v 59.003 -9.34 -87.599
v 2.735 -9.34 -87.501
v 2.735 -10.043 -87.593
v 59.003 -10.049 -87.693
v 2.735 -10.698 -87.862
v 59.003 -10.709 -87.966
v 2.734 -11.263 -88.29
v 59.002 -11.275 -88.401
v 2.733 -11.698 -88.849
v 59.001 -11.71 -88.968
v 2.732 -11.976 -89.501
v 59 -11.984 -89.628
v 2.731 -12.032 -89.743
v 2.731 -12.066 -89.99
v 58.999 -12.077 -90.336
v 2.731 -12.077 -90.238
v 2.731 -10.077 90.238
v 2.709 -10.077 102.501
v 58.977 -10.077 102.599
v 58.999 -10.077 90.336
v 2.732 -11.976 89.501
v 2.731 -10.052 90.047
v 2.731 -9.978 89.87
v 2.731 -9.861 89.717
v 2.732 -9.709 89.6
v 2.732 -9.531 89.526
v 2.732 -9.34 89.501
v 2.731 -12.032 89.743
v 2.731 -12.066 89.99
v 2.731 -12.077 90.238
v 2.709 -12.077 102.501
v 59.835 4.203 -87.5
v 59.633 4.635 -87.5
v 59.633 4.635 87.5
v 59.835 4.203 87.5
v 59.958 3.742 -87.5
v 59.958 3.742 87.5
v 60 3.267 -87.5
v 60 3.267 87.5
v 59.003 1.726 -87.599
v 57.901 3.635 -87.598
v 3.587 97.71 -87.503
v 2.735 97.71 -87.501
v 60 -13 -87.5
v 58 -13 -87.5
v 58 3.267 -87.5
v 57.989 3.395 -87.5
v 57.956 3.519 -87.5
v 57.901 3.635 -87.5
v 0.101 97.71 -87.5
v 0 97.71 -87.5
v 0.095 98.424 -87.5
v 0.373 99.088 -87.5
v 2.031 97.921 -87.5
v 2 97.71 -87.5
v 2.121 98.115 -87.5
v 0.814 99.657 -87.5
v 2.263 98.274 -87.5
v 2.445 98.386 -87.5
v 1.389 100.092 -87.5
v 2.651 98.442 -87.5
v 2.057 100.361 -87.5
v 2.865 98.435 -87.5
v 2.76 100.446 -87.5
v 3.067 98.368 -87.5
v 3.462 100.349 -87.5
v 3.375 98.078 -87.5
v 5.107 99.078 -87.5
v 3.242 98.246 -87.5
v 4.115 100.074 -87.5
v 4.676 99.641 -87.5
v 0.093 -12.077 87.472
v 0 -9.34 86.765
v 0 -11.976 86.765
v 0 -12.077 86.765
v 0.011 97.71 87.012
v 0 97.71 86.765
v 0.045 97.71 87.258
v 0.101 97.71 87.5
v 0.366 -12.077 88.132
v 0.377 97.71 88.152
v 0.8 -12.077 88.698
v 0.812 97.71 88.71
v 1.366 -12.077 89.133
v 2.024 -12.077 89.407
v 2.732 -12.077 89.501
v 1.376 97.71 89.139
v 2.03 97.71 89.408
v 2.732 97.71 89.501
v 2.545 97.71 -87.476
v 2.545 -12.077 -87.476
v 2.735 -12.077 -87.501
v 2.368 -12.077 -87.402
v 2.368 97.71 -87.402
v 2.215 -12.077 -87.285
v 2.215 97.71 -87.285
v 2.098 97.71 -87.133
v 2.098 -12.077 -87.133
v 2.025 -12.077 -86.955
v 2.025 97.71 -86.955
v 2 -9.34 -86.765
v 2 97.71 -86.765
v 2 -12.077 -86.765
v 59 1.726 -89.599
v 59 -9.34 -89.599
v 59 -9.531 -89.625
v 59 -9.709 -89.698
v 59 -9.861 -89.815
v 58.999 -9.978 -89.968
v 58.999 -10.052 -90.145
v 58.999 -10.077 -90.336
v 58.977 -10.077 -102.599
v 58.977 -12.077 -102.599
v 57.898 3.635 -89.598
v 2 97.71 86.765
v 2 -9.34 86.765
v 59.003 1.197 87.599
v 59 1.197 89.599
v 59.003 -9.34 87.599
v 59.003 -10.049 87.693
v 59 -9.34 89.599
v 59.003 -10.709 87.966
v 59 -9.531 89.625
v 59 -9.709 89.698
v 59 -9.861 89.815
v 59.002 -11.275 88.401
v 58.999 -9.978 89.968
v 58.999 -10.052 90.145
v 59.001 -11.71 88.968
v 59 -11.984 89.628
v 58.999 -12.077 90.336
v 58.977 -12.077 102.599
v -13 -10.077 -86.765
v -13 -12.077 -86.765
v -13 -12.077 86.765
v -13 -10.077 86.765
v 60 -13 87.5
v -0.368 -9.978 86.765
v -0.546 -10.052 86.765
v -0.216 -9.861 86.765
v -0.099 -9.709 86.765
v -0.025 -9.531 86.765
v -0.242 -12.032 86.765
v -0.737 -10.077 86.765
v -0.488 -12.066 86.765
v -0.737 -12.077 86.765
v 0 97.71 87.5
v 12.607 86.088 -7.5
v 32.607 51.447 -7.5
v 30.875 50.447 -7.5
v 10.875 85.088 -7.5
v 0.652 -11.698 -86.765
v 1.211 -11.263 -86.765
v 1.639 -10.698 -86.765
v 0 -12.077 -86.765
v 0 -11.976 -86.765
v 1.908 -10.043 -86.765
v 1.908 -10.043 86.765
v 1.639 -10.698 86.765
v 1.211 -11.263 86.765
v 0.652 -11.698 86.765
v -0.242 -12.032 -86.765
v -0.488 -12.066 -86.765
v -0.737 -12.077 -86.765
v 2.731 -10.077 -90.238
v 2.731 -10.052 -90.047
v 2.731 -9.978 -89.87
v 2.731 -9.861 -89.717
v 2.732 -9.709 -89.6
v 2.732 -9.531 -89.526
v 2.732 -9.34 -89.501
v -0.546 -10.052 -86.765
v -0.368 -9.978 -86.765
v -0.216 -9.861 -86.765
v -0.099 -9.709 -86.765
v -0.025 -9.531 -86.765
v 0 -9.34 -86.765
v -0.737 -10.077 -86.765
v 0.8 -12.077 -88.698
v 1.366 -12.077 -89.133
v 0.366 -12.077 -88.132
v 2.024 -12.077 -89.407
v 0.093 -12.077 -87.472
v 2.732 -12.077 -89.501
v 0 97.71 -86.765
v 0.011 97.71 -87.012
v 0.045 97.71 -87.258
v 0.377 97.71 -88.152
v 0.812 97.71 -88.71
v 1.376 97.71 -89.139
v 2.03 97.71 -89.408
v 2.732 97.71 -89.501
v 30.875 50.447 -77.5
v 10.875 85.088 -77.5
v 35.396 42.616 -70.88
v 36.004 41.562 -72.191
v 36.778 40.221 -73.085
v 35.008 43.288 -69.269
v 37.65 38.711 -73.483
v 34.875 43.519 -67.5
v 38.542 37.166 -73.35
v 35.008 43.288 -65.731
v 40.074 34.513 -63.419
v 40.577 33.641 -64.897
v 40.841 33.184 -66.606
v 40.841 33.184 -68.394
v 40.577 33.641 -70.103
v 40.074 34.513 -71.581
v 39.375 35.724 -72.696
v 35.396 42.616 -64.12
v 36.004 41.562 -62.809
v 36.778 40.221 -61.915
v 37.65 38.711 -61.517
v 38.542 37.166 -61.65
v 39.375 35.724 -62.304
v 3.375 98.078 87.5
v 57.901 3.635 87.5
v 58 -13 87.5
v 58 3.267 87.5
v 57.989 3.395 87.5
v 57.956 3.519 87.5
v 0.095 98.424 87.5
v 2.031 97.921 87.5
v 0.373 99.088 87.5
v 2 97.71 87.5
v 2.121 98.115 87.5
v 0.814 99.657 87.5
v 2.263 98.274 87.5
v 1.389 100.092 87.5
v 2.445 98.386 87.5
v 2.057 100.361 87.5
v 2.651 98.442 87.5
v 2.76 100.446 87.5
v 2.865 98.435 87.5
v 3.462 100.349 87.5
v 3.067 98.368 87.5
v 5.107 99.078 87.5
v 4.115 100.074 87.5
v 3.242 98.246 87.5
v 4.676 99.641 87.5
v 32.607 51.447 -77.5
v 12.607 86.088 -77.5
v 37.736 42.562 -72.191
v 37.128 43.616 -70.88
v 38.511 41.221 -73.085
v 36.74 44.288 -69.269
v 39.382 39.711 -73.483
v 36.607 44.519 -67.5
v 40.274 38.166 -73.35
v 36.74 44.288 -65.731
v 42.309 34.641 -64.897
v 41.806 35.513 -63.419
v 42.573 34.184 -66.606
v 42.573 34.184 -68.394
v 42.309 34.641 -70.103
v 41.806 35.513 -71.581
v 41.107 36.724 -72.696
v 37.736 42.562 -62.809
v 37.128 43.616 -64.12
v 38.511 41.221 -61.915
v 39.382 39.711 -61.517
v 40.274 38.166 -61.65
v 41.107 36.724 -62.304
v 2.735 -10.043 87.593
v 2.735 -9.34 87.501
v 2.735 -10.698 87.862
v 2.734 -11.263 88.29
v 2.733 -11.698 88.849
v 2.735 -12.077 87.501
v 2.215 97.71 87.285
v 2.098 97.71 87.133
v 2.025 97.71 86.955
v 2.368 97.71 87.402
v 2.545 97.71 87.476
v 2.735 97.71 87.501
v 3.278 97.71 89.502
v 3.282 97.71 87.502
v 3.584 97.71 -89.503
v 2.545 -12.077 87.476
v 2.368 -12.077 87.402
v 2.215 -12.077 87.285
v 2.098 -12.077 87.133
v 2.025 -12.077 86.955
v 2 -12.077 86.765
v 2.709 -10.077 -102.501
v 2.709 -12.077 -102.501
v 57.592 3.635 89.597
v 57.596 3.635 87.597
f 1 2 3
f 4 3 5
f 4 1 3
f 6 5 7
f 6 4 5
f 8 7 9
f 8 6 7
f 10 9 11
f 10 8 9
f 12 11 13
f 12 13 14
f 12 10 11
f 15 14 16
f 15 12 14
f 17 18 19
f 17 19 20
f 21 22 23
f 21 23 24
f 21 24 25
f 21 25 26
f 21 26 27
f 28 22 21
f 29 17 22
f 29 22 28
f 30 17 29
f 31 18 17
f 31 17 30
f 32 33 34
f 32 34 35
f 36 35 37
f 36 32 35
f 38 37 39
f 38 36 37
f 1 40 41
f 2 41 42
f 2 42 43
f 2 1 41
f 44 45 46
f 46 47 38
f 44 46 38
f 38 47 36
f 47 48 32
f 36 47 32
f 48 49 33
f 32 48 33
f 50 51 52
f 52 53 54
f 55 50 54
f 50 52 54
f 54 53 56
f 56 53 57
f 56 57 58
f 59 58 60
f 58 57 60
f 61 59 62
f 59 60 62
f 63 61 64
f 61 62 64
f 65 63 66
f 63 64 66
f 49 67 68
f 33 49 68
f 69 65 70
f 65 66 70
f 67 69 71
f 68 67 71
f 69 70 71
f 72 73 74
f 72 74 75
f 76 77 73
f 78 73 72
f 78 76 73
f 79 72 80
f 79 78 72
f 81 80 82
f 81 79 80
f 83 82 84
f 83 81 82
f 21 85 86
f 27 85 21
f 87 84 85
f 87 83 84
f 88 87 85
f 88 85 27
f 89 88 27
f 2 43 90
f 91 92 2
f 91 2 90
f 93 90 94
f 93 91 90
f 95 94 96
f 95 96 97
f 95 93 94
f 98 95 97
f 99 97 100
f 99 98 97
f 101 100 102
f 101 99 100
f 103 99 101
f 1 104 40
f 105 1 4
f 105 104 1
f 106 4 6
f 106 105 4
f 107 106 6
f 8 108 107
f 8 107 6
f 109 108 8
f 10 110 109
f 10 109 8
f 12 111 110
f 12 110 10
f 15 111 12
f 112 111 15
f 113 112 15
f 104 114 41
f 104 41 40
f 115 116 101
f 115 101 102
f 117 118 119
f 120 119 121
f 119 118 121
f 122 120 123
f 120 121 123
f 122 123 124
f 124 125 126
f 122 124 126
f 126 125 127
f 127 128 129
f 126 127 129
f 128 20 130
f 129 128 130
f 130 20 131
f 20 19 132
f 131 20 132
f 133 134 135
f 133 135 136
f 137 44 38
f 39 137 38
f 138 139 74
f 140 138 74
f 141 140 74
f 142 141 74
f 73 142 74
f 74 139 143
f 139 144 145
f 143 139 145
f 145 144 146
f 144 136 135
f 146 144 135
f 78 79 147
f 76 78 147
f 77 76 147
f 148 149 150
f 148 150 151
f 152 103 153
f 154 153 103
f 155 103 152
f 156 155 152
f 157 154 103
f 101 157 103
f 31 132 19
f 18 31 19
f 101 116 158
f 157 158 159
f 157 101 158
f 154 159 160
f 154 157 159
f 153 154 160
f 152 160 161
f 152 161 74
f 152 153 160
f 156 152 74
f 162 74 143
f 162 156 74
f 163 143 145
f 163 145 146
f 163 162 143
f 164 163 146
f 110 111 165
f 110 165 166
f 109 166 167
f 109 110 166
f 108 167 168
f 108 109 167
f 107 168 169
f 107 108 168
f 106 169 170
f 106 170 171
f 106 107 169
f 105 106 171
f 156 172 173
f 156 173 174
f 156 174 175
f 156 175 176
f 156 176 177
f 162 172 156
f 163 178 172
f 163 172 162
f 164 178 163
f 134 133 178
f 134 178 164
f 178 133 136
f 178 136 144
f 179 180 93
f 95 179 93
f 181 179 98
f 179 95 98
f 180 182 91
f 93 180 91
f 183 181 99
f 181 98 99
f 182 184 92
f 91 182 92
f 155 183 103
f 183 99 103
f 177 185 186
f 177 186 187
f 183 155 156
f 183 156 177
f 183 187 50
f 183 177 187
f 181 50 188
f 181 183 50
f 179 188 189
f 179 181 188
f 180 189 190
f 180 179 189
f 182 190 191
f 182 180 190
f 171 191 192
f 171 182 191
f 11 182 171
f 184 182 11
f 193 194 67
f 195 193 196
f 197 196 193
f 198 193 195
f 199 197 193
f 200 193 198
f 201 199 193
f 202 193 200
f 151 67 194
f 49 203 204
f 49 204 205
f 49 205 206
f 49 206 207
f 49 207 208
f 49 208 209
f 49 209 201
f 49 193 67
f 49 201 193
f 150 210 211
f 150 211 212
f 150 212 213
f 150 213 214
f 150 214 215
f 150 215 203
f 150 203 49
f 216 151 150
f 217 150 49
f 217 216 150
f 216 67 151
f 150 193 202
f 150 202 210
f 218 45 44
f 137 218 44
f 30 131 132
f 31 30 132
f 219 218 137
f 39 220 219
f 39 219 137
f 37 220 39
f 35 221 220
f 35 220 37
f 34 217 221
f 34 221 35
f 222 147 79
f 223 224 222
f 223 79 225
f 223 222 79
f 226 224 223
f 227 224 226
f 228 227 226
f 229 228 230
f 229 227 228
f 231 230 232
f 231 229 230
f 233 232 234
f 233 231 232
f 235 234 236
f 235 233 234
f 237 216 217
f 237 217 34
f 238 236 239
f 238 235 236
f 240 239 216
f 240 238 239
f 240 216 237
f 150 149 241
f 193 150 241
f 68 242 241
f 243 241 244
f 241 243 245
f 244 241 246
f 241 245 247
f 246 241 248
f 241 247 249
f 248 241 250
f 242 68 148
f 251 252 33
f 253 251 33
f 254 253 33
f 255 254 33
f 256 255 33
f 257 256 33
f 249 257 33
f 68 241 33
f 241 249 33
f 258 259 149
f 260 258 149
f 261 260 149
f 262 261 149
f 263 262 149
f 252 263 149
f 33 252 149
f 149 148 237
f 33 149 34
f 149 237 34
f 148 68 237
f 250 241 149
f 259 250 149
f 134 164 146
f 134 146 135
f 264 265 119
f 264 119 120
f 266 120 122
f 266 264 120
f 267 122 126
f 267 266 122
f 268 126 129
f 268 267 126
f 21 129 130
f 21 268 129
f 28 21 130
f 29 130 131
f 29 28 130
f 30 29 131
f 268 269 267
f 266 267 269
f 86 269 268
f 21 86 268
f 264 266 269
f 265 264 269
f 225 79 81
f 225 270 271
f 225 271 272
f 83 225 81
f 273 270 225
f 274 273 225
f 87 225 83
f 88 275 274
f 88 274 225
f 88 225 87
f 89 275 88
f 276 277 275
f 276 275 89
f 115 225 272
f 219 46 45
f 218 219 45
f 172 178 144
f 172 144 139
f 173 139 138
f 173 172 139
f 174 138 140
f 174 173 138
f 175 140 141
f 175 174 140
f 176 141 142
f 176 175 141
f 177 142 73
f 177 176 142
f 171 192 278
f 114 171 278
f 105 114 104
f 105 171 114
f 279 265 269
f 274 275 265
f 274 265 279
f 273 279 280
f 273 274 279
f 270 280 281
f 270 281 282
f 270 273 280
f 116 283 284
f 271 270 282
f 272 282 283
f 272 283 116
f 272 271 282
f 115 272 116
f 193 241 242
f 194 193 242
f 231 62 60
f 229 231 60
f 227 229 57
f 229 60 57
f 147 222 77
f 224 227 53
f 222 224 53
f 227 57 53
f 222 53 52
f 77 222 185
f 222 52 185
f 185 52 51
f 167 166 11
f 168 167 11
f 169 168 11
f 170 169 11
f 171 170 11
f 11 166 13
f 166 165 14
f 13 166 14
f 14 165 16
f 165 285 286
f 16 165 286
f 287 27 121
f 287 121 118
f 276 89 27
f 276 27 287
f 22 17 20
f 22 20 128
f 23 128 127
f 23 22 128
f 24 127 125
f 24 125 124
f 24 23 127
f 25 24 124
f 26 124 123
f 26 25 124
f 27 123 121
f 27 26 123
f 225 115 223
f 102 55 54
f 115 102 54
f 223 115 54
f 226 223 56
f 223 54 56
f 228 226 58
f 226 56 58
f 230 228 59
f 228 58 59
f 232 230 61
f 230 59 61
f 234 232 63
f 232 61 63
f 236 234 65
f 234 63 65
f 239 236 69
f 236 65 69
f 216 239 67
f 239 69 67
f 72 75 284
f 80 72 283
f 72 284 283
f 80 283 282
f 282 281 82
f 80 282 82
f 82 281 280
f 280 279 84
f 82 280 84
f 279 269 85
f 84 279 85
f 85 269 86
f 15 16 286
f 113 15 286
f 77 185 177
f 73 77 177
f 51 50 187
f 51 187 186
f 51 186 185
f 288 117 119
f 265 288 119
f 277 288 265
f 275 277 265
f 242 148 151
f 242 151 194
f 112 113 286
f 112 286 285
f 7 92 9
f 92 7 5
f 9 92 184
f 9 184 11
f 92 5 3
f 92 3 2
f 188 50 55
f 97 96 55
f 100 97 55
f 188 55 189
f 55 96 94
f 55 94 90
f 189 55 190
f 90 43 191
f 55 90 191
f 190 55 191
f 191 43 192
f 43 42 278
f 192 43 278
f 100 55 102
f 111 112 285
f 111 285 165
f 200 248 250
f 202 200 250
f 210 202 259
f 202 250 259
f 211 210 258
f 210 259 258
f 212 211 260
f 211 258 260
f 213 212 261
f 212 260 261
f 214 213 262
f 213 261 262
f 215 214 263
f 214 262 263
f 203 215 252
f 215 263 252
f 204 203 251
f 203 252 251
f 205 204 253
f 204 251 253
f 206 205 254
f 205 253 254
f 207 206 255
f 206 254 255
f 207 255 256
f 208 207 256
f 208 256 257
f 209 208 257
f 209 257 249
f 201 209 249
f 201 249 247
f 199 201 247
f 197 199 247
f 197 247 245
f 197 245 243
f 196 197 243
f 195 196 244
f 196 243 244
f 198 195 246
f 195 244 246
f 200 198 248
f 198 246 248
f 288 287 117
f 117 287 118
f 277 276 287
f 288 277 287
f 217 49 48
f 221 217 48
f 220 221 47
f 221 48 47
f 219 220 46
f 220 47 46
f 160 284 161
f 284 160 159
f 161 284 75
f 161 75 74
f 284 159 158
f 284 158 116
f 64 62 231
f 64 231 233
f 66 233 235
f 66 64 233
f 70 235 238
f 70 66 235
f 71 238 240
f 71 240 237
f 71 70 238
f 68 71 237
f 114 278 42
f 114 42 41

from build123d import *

# Parameters (mm, degrees)
CROQUIS3_W                         = 120
CROQUIS3_H                         = 175
BRIDA_BASE1_DEPTH                  = 2
BRIDA_START                        = -87.5
BRIDA_DE_ARISTA1_DEPTH             = 175
BRIDA_DE_ARISTA1_2_DEPTH           = 175
BRIDA_DE_ARISTA2_DEPTH             = 175
BRIDA_DE_ARISTA2_2_DEPTH           = 175
BRIDA_DE_ARISTA3_STRIP_CUT_DEPTH   = 109.78686976
BRIDA_DE_ARISTA3_STRIP_CUT_2_DEPTH = 109.78686976
BRIDA_DE_ARISTA3_DEPTH             = 109.78686976
BRIDA_DE_ARISTA3_BEND_DEPTH        = 109.78686976
CORTAR_EXTRUIR5_DEPTH              = 2
CORTAR_EXTRUIR6_DEPTH              = 2
BRIDA_DE_ARISTA4_STRIP_W           = 9.4732
BRIDA_DE_ARISTA4_STRIP_H           = 2
BRIDA_DE_ARISTA4_STRIP_CUT_DEPTH   = 56.268172105
BRIDA_DE_ARISTA4_STRIP_2_W         = 9.4732
BRIDA_DE_ARISTA4_STRIP_2_H         = 2
BRIDA_DE_ARISTA4_STRIP_CUT_2_DEPTH = 173.529368978
BRIDA_DE_ARISTA4_STRIP_3_W         = 9.4732
BRIDA_DE_ARISTA4_STRIP_3_H         = 2
BRIDA_DE_ARISTA4_STRIP_CUT_3_DEPTH = 56.268172105
BRIDA_DE_ARISTA4_DEPTH             = 56.268172105
BRIDA_DE_ARISTA4_BEND_DEPTH        = 173.529368978
BRIDA_DE_ARISTA4_BEND_2_DEPTH      = 56.268172105
CROQUIS37_R                        = 6
CROQUIS37_W                        = 70
CROQUIS37_H                        = 40
CORTAR_EXTRUIR7_DEPTH              = 2


# Read off the part's stored shape, not the designer's step: Brida de arista1, Brida de arista2
# Sheet-metal steps are written as plain solids
with BuildPart() as part:
    # Croquis3 → Brida base1 (new body)
    with BuildSketch(Plane(origin=(45, 25.980762114, 0), x_dir=(0.5000000000000044, -0.8660254037844362, 0), z_dir=(-0.8660254037844362, -0.5000000000000044, 0))):
        with Locations((-30, 0)):
            Rectangle(CROQUIS3_W, CROQUIS3_H)
    extrude(amount=-BRIDA_BASE1_DEPTH)

    # Brida de arista1 outline → Brida de arista1 (cut)
    with BuildSketch(Plane.XY.offset(BRIDA_START)):
        with BuildLine():
            Line((0, 103.923048454), (2.056713114, 100.360716845))
            ThreePointArc((2.056713114, 100.360716845), (3.797397716, 100.232553298), (5.10656512, 99.078218214))
            Line((5.10656512, 99.078218214), (1.732050808, 104.923048454))
            Line((1.732050808, 104.923048454), (0, 103.923048454))
        make_face()
    extrude(amount=BRIDA_DE_ARISTA1_DEPTH, mode=Mode.SUBTRACT)

    # Brida de arista1 2 outline → Brida de arista1 2 (add)
    with BuildSketch(Plane.XY.offset(BRIDA_START)):
        with BuildLine():
            ThreePointArc((2.056713114, 100.360716845), (0.574476274, 99.387476127), (0, 97.709918214))
            Line((0, 97.709918214), (0, -12.076951546))
            Line((0, -12.076951546), (2, -12.076951546))
            Line((2, -12.076951546), (2, 97.709918214))
            ThreePointArc((2, 97.709918214), (2.545953891, 98.421419178), (3.374514312, 98.078218214))
            Line((3.374514312, 98.078218214), (2.056713114, 100.360716845))
        make_face()
    extrude(amount=BRIDA_DE_ARISTA1_2_DEPTH)

    # Brida de arista2 outline → Brida de arista2 (cut)
    with BuildSketch(Plane.XY.offset(BRIDA_START)):
        with BuildLine():
            ThreePointArc((59.63336512, 4.63503024), (59.906752616, 3.975014439), (60, 3.26673024))
            Line((60, 3.26673024), (60, 0))
            Line((60, 0), (61.732050808, 1))
            Line((61.732050808, 1), (59.63336512, 4.63503024))
        make_face()
    extrude(amount=BRIDA_DE_ARISTA2_DEPTH, mode=Mode.SUBTRACT)

    # Brida de arista2 2 outline → Brida de arista2 2 (add)
    with BuildSketch(Plane.XY.offset(BRIDA_START)):
        with BuildLine():
            Line((60, -13), (60, 0))
            Line((60, 0), (57.901314312, 3.63503024))
            ThreePointArc((57.901314312, 3.63503024), (57.974900964, 3.457376349), (58, 3.26673024))
            Line((58, 3.26673024), (58, -13))
            Line((58, -13), (60, -13))
        make_face()
    extrude(amount=BRIDA_DE_ARISTA2_2_DEPTH)

    # Brida de arista3 strip (across the edge) → Brida de arista3 strip cut (cut)
    with BuildSketch(Plane(origin=(2, -12.076951546, -87.5), x_dir=(0.0017453283659016917, 0, 0.9999984769132877), z_dir=(0, 1, 0))):
        Polygon((-8.741361837, -1.984746476), (0.731823734, -2.001280321), (0.735314391, -0.001283367), (-8.73787118, 0.015250478), align=None)
    extrude(amount=BRIDA_DE_ARISTA3_STRIP_CUT_DEPTH, mode=Mode.SUBTRACT)

    # Brida de arista3 strip 2 (across the edge) → Brida de arista3 strip cut 2 (cut)
    with BuildSketch(Plane(origin=(2, 97.709918214, 87.5), x_dir=(0.0017453283659016917, 0, -0.9999984769132877), z_dir=(0, -1, 0))):
        Polygon((-8.741361837, -1.984746476), (0.731823734, -2.001280321), (0.735314391, -0.001283367), (-8.73787118, 0.015250478), align=None)
    extrude(amount=BRIDA_DE_ARISTA3_STRIP_CUT_2_DEPTH, mode=Mode.SUBTRACT)

    # Brida de arista3 section (across the edge) → Brida de arista3 (add)
    with BuildSketch(Plane(origin=(2, -12.076951546, -87.5), x_dir=(0.0017453283659016917, 0, 0.9999984769132877), z_dir=(0, 1, 0))):
        with BuildLine():
            Line((-2, 0.735315511), (-2, 57.003487616))
            Line((-2, 57.003487616), (0, 57.003487616))
            Line((0, 57.003487616), (0, 0.735315511))
            ThreePointArc((0, 0.735315511), (0.215290812, 0.214915386), (0.735314391, -0.001283367))
            Line((0.735314391, -0.001283367), (0.731823734, -2.001280321))
            ThreePointArc((0.731823734, -2.001280321), (-1.200156346, -1.198063504), (-2, 0.735315511))
        make_face()
    extrude(amount=BRIDA_DE_ARISTA3_DEPTH)

    # Brida de arista3 section 2 (across the edge) → Brida de arista3 bend (add)
    with BuildSketch(Plane(origin=(2, 97.709918214, 87.5), x_dir=(0.0017453283659016917, 0, -0.9999984769132877), z_dir=(0, -1, 0))):
        with BuildLine():
            Line((-2, 0.735315511), (-2, 57.003487616))
            Line((-2, 57.003487616), (0, 57.003487616))
            Line((0, 57.003487616), (0, 0.735315511))
            ThreePointArc((0, 0.735315511), (0.215290812, 0.214915386), (0.735314391, -0.001283367))
            Line((0.735314391, -0.001283367), (0.731823734, -2.001280321))
            ThreePointArc((0.731823734, -2.001280321), (-1.200156346, -1.198063504), (-2, 0.735315511))
        make_face()
    extrude(amount=BRIDA_DE_ARISTA3_BEND_DEPTH)

    # Croquis23 → Cortar-Extruir5 (cut)
    with BuildSketch(Plane(origin=(-0.156200564, 0, 89.496239762), x_dir=(0.9999984769132877, 0, 0.0017453283659016985), z_dir=(-0.0017453283659016987, 0, 0.9999984769132878))):
        Polygon((3.221792941, 98.078218214), (57.748509892, 3.63503024), (59.156200802, 1.196834349), (59.156200802, 97.709918214), align=None)
    extrude(amount=-CORTAR_EXTRUIR5_DEPTH, mode=Mode.SUBTRACT)

    # Croquis24 → Cortar-Extruir6 (cut)
    with BuildSketch(Plane(origin=(-0.156200564, 0, -89.496239762), x_dir=(-0.9999984769132877, 0, 0.001745328365901773), z_dir=(-0.0017453283659017733, 0, -0.9999984769132878))):
        Polygon((-3.527225405, 98.078218214), (-58.053942356, 3.63503024), (-59.156200802, 1.725859701), (-59.156200802, 97.709918214), align=None)
    extrude(amount=-CORTAR_EXTRUIR6_DEPTH, mode=Mode.SUBTRACT)

    # Brida de arista4 strip (across the edge) → Brida de arista4 strip cut (cut)
    with BuildSketch(Plane(origin=(58.999910138, -12.076951546, -89.599486758), x_dir=(0, 1, 0), z_dir=(-0.9999984769132877, -4.100332633432973e-15, 0.00174532836590182))):
        with Locations((-2, -1)):
            Rectangle(BRIDA_DE_ARISTA4_STRIP_W, BRIDA_DE_ARISTA4_STRIP_H)
    extrude(amount=BRIDA_DE_ARISTA4_STRIP_CUT_DEPTH, mode=Mode.SUBTRACT)

    # Brida de arista4 strip 2 (across the edge) → Brida de arista4 strip cut 2 (cut)
    with BuildSketch(Plane(origin=(0, -12.076951546, -86.764684489), x_dir=(0, 1, 0), z_dir=(0, 0, 1))):
        with Locations((-2, -1)):
            Rectangle(BRIDA_DE_ARISTA4_STRIP_2_W, BRIDA_DE_ARISTA4_STRIP_2_H)
    extrude(amount=BRIDA_DE_ARISTA4_STRIP_CUT_2_DEPTH, mode=Mode.SUBTRACT)

    # Brida de arista4 strip 3 (across the edge) → Brida de arista4 strip cut 3 (cut)
    with BuildSketch(Plane(origin=(2.731823734, -12.076951546, 89.501280321), x_dir=(0, 1, 0), z_dir=(0.9999984769132877, 2.0039219637078435e-15, 0.0017453283659018195))):
        with Locations((-2, -1)):
            Rectangle(BRIDA_DE_ARISTA4_STRIP_3_W, BRIDA_DE_ARISTA4_STRIP_3_H)
    extrude(amount=BRIDA_DE_ARISTA4_STRIP_CUT_3_DEPTH, mode=Mode.SUBTRACT)

    # Brida de arista4 section (across the edge) → Brida de arista4 (add)
    with BuildSketch(Plane(origin=(58.999910138, -12.076951546, -89.599486758), x_dir=(0, 1, 0), z_dir=(-0.9999984769132877, -4.100332633432973e-15, 0.00174532836590182))):
        with BuildLine():
            Line((0, 0.7366), (0, 13))
            Line((0, 13), (2, 13))
            Line((2, 13), (2, 0.7366))
            ThreePointArc((2, 0.7366), (2.215745145, 0.215745145), (2.7366, 0))
            Line((2.7366, 0), (2.7366, -2))
            ThreePointArc((2.7366, -2), (0.801531583, -1.198468417), (0, 0.7366))
        make_face()
    extrude(amount=BRIDA_DE_ARISTA4_DEPTH)

    # Brida de arista4 section 2 (across the edge) → Brida de arista4 bend (add)
    with BuildSketch(Plane(origin=(0, -12.076951546, -86.764684489), x_dir=(0, 1, 0), z_dir=(0, 0, 1))):
        with BuildLine():
            Line((0, 0.7366), (0, 13))
            Line((0, 13), (2, 13))
            Line((2, 13), (2, 0.7366))
            ThreePointArc((2, 0.7366), (2.215745145, 0.215745145), (2.7366, 0))
            Line((2.7366, 0), (2.7366, -2))
            ThreePointArc((2.7366, -2), (0.801531583, -1.198468417), (0, 0.7366))
        make_face()
    extrude(amount=BRIDA_DE_ARISTA4_BEND_DEPTH)

    # Brida de arista4 section 3 (across the edge) → Brida de arista4 bend 2 (add)
    with BuildSketch(Plane(origin=(2.731823734, -12.076951546, 89.501280321), x_dir=(0, 1, 0), z_dir=(0.9999984769132877, 2.0039219637078435e-15, 0.0017453283659018195))):
        with BuildLine():
            Line((0, 0.7366), (0, 13))
            Line((0, 13), (2, 13))
            Line((2, 13), (2, 0.7366))
            ThreePointArc((2, 0.7366), (2.215745145, 0.215745145), (2.7366, 0))
            Line((2.7366, 0), (2.7366, -2))
            ThreePointArc((2.7366, -2), (0.801531583, -1.198468417), (0, 0.7366))
        make_face()
    extrude(amount=BRIDA_DE_ARISTA4_BEND_2_DEPTH)

    # Croquis37 → Cortar-Extruir7 (cut)
    with BuildSketch(Plane(origin=(46.732050808, 26.980762114, 0), x_dir=(0, 0, -1), z_dir=(0.866025403784436, 0.5000000000000047, 0))):
        with Locations(Location((67.5, 14.250971375, 0), (0, 0, 90))):
            Circle(CROQUIS37_R)
        with Locations((42.5, 48.250971375)):
            Rectangle(CROQUIS37_W, CROQUIS37_H)
    extrude(amount=-CORTAR_EXTRUIR7_DEPTH, mode=Mode.SUBTRACT)


solid = part.part
